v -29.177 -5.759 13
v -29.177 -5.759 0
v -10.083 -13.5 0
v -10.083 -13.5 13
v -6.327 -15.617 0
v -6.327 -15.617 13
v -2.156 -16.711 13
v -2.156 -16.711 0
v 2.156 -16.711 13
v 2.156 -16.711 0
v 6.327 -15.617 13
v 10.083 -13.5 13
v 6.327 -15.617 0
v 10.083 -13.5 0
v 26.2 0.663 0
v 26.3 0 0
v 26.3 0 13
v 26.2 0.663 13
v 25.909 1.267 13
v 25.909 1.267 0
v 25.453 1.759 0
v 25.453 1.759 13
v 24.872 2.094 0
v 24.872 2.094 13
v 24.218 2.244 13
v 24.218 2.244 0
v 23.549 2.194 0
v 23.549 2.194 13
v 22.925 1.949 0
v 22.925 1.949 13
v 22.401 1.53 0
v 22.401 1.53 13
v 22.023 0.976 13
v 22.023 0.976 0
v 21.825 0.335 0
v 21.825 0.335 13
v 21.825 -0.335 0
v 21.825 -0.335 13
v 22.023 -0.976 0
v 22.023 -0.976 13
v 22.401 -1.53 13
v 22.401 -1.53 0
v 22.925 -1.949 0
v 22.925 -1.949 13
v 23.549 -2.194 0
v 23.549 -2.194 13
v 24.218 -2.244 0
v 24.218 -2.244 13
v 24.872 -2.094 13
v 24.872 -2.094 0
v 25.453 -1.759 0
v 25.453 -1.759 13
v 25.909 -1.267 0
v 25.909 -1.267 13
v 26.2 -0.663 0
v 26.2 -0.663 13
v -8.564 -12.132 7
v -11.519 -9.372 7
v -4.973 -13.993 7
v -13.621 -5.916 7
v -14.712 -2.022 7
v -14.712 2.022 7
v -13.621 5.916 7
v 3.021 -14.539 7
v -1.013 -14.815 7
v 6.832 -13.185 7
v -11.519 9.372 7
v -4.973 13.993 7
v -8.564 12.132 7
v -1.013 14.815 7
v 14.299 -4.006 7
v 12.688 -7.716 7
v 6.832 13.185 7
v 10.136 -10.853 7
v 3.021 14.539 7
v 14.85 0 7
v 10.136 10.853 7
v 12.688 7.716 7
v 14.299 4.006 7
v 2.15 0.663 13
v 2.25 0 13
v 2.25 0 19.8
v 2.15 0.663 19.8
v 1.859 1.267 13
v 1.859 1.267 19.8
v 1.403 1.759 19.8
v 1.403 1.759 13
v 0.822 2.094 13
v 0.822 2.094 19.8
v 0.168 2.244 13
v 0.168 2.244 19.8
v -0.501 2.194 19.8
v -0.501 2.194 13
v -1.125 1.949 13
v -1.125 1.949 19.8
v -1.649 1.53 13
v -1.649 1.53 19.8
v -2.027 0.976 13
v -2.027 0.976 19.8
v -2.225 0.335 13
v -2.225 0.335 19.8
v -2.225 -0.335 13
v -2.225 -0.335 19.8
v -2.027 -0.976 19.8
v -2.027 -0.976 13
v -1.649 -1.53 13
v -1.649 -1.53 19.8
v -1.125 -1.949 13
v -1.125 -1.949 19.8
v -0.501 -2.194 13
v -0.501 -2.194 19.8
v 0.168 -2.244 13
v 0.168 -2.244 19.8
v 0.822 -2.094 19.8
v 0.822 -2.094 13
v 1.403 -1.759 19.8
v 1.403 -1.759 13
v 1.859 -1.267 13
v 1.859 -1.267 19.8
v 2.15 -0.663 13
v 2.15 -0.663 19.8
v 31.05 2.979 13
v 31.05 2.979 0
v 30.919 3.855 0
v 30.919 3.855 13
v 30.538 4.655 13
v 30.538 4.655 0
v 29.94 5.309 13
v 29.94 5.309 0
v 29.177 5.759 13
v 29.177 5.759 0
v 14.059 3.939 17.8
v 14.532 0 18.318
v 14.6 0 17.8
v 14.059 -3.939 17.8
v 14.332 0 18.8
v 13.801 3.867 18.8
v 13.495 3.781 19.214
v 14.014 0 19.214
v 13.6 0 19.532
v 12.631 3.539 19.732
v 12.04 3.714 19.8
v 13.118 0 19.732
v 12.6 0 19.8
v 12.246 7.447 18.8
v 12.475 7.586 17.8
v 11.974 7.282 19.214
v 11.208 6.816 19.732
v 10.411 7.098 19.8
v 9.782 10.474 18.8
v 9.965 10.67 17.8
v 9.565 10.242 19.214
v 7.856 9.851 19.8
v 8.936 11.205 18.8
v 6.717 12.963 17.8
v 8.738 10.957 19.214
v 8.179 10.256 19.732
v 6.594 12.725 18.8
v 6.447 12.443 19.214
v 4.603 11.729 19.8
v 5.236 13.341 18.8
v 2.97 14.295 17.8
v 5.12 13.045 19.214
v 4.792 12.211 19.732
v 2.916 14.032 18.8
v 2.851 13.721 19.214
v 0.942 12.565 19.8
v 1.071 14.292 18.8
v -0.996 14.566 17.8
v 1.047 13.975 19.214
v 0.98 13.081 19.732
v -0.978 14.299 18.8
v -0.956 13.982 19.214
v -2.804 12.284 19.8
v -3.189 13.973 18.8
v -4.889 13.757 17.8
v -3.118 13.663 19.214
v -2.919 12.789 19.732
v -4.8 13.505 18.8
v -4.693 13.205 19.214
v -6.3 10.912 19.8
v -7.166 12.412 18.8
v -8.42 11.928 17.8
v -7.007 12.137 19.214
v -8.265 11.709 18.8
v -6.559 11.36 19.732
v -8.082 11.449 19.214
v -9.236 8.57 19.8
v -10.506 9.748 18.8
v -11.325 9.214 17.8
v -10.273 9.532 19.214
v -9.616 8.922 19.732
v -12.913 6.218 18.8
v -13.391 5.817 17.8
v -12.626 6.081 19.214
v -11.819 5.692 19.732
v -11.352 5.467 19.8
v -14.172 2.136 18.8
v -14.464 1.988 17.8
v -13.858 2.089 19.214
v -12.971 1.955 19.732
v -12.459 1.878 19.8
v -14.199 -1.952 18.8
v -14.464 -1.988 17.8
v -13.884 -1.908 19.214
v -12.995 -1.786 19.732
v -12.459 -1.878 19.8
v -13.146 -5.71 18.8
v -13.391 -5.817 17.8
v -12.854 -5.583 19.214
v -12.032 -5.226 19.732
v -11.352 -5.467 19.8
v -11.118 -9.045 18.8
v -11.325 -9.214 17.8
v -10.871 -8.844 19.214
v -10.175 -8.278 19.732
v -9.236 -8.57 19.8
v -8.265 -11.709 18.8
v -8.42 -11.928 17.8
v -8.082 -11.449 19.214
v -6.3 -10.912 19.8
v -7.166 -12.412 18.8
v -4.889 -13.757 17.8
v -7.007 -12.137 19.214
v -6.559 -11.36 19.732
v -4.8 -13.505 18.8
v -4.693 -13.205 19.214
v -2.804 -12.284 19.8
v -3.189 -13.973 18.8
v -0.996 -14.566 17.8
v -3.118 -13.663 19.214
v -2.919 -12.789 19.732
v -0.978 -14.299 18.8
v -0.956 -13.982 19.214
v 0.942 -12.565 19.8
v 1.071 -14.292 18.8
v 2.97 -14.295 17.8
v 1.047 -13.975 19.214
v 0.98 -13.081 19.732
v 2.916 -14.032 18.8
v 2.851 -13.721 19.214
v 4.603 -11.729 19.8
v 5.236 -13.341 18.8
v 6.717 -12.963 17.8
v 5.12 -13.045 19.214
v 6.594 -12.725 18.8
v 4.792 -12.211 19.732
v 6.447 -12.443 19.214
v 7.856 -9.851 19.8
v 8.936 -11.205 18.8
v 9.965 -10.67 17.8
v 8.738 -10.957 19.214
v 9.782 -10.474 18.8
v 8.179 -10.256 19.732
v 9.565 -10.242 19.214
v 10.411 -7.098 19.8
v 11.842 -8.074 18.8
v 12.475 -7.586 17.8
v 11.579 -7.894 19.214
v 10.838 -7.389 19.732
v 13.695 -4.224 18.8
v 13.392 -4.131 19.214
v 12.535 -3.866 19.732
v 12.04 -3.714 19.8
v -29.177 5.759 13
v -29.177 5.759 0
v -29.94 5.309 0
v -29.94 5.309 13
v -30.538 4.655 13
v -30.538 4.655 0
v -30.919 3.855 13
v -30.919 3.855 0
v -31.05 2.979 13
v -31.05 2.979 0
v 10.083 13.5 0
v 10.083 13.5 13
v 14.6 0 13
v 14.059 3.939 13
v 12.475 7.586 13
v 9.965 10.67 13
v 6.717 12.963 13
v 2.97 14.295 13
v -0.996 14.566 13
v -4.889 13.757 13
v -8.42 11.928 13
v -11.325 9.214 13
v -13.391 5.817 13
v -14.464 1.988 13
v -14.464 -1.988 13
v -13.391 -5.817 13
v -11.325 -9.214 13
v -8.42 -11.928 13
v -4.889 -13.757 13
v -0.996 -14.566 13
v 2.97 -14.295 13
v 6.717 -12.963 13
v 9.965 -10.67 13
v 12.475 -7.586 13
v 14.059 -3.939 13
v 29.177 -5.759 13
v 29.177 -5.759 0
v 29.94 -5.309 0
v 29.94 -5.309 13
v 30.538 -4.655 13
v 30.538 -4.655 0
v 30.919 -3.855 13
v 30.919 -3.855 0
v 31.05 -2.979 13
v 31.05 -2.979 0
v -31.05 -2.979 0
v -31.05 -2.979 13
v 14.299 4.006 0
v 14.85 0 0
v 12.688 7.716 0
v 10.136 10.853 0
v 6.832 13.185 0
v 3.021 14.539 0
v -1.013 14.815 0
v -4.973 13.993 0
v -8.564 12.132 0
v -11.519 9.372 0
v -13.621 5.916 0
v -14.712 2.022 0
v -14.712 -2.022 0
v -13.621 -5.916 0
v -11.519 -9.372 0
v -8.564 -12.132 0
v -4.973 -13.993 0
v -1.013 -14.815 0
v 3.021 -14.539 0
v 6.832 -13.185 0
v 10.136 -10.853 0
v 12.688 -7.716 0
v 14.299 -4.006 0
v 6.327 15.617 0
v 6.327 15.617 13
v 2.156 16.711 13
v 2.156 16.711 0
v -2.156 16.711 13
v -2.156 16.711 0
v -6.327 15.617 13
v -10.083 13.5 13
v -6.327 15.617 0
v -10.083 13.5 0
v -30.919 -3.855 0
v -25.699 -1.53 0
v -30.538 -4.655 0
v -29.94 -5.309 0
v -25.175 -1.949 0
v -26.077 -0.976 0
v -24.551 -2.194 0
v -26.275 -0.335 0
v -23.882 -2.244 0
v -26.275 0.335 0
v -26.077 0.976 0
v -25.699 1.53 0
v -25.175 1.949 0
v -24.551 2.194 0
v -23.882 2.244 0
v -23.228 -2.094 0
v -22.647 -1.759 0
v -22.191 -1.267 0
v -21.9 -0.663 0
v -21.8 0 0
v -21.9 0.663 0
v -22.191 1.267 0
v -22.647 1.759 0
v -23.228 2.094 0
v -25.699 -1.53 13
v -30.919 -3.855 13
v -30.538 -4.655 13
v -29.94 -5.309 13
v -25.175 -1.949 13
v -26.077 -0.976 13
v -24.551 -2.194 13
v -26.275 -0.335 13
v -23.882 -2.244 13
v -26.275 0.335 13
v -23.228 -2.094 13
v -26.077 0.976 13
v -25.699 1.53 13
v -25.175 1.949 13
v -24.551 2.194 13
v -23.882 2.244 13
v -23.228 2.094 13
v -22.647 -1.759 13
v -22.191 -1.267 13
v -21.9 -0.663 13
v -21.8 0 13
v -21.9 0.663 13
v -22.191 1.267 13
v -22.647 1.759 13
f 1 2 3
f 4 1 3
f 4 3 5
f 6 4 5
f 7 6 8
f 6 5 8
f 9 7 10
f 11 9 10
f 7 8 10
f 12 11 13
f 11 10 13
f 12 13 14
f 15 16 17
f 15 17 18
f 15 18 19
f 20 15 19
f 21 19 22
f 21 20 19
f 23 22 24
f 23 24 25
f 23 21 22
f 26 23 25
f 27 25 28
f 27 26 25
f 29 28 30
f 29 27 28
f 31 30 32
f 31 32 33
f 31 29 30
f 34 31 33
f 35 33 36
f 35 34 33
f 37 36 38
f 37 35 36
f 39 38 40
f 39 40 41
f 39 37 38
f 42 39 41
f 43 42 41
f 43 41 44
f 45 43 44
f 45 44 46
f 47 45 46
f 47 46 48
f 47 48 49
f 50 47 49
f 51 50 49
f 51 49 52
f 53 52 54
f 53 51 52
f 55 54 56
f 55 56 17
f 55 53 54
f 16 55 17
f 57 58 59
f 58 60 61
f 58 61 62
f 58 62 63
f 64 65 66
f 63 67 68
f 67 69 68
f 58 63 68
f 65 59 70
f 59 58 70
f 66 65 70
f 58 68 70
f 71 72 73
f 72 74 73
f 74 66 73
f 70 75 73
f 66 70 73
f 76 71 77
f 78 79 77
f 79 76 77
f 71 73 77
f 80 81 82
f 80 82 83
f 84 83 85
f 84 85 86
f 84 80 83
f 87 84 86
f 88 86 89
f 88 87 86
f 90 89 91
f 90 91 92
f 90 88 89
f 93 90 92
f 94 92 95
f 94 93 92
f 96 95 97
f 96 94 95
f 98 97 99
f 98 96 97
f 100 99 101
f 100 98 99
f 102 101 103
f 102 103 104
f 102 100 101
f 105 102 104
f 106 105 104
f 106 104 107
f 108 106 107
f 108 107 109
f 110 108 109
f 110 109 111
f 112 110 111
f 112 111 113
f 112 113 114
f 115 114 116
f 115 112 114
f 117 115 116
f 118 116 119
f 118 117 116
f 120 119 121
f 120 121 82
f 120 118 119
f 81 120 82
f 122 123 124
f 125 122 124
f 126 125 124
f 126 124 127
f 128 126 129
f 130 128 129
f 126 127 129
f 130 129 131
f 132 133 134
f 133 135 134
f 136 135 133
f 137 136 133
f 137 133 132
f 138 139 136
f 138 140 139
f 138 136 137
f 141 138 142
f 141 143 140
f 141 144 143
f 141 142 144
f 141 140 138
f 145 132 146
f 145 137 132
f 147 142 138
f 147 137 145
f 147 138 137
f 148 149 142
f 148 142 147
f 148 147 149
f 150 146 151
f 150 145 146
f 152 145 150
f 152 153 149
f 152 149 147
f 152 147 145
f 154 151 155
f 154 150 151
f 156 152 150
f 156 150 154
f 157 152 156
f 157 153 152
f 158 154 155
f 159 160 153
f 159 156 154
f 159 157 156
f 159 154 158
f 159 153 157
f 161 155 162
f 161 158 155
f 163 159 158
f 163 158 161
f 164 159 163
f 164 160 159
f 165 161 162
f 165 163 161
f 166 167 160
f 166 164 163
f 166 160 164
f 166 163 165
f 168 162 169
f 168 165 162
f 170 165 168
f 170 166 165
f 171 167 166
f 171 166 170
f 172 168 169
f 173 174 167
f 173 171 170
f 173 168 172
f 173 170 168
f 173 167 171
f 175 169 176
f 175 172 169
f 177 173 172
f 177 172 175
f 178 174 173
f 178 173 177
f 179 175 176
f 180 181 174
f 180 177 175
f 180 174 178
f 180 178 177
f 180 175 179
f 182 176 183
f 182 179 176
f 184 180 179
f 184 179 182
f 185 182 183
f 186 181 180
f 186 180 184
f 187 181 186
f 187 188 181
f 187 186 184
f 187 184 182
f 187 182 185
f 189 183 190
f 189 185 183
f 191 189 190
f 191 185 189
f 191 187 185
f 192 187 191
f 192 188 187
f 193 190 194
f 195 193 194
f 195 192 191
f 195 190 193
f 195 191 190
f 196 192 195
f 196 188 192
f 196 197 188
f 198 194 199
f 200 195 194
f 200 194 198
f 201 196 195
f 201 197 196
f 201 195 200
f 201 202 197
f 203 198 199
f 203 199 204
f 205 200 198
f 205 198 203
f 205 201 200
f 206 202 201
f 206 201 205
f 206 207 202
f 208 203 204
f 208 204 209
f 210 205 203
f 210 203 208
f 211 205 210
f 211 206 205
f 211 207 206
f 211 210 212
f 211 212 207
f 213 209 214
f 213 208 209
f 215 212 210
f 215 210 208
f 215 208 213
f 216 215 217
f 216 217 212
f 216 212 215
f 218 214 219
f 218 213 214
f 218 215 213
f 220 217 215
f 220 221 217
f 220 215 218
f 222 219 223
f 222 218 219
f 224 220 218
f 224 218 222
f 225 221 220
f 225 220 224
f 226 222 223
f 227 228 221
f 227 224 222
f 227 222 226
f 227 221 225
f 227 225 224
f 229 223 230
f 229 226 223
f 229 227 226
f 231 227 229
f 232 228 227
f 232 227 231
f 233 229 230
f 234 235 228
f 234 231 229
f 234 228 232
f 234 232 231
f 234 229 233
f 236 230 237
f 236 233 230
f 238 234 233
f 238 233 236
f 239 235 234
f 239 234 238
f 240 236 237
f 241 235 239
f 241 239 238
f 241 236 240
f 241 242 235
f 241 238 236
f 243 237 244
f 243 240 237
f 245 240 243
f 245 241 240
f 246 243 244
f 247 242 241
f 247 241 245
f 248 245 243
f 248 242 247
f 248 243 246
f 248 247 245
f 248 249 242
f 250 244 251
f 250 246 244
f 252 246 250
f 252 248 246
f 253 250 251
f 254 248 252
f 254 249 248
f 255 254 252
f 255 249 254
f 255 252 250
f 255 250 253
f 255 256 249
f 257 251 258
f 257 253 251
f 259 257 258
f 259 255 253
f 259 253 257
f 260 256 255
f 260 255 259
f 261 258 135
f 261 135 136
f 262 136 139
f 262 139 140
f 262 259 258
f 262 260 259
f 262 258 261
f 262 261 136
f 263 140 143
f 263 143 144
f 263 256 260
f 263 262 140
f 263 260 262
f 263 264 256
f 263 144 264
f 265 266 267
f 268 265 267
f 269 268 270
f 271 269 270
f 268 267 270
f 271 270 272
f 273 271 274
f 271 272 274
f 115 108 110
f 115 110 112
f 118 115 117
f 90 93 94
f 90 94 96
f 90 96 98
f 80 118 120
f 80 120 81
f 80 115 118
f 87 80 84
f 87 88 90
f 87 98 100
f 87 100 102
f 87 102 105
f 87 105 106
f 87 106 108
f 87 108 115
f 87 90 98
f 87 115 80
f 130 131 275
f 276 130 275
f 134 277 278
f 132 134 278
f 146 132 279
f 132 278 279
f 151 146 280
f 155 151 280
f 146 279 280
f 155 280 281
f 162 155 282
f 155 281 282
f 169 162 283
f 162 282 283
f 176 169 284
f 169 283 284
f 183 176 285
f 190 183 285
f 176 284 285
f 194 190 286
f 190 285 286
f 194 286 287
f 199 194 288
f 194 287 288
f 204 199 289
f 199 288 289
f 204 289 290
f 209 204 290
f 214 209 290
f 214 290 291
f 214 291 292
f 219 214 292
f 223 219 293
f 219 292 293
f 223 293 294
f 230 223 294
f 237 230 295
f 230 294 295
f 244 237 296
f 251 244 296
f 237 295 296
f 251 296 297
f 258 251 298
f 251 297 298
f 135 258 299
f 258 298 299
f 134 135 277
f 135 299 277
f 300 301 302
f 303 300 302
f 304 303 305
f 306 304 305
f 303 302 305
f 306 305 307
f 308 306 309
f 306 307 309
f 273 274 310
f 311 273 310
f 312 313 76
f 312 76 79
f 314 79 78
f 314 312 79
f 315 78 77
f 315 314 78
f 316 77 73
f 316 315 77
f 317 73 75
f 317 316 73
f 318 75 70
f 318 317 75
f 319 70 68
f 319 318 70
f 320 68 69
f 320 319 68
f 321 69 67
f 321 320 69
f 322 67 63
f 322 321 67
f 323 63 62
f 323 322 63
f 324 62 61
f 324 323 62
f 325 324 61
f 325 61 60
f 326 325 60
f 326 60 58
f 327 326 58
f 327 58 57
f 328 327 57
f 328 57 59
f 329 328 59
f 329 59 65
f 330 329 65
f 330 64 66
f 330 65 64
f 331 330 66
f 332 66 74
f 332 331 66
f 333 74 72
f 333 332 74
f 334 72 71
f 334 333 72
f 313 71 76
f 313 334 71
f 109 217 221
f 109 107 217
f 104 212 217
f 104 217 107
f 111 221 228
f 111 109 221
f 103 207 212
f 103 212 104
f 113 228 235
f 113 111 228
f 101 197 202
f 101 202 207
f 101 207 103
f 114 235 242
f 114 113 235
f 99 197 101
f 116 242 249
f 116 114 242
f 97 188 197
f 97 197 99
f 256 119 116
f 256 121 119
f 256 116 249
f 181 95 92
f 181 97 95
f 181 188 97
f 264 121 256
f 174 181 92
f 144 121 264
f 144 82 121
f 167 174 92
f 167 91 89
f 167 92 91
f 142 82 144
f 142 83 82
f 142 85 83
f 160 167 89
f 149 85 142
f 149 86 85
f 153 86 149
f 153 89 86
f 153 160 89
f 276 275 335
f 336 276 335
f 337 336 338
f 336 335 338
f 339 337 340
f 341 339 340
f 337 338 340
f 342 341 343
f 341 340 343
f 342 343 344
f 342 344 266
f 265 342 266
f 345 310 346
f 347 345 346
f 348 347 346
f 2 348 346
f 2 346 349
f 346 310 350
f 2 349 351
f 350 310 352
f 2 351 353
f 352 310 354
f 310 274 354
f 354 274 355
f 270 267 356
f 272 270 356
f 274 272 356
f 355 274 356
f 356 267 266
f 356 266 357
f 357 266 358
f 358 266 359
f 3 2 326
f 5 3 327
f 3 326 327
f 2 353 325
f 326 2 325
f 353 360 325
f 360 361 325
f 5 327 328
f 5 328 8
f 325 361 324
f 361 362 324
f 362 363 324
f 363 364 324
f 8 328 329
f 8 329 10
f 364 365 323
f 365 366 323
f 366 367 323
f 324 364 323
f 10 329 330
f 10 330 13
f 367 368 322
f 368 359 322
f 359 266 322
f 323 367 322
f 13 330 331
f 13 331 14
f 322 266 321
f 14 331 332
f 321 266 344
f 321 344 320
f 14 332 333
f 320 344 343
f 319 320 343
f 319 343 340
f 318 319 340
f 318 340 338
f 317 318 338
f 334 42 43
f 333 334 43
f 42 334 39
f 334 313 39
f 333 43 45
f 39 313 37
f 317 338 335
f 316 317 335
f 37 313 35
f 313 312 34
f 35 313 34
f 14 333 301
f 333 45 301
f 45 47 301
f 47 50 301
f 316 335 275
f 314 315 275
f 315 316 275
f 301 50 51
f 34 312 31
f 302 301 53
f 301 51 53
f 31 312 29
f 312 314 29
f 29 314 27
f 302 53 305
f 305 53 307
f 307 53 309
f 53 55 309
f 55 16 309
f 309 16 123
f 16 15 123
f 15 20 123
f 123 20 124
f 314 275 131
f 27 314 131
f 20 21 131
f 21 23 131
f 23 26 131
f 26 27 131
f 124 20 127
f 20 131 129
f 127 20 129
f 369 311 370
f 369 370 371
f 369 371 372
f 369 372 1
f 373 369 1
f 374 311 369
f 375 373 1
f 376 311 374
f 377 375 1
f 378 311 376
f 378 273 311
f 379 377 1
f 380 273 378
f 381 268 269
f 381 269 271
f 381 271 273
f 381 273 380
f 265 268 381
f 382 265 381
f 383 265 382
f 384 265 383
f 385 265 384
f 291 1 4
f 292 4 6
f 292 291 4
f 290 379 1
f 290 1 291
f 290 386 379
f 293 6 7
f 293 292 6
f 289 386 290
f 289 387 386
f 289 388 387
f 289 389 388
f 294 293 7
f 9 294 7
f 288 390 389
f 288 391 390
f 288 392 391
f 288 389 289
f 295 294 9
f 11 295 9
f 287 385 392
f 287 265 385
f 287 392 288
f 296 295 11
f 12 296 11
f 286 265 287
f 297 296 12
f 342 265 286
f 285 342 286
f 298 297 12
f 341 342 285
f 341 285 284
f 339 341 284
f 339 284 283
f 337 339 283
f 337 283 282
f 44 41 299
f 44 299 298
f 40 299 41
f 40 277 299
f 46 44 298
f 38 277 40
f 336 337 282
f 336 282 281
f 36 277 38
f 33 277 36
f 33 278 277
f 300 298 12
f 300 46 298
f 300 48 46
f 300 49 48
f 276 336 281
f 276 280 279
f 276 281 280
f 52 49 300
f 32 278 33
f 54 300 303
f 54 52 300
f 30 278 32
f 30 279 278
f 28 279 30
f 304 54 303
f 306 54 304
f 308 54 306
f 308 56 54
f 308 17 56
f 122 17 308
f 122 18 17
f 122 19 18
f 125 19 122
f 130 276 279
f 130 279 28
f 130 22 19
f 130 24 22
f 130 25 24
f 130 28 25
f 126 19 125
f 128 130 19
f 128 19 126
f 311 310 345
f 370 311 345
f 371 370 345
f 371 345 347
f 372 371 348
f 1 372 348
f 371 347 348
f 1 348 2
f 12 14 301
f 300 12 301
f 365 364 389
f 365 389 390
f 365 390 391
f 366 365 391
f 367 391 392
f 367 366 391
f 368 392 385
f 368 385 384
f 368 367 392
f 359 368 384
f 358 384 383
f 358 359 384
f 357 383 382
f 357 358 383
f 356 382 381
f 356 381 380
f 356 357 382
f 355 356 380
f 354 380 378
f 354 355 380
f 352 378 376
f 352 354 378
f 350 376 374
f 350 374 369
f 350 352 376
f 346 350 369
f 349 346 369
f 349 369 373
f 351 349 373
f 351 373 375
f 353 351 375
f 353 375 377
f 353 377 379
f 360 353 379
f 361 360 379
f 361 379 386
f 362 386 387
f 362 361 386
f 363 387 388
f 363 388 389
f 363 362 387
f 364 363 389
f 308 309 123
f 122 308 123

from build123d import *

# Parameters (mm, degrees)
F0_R     = 14.85
F0_R_2   = 2.25
F1_DEPTH = 13
F2_R     = 15.05
F3_DEPTH = 6
F4_R     = 14.6
F4_R_2   = 2.25
F5_DEPTH = 6.8
F6_R     = 2


with BuildPart() as f1:
    # F0 (on Top) → F1 (new body)
    with BuildSketch(Plane.XY):
        with BuildLine():
            ThreePointArc((10.083278, -13.5), (15.063627, -7.550472), (16.85, 0))
            ThreePointArc((16.85, 0), (15.063627, 7.550472), (10.083278, 13.5))
            ThreePointArc((10.083278, 13.5), (0, 16.85), (-10.083278, 13.5))
            ThreePointArc((-10.083278, 13.5), (-16.85, 0), (-10.083278, -13.5))
            ThreePointArc((-10.083278, -13.5), (0, -16.85), (10.083278, -13.5))
        make_face()
        Circle(F0_R, mode=Mode.SUBTRACT)
        with BuildLine():
            ThreePointArc((10.083278, 13.5), (15.063627, 7.550472), (16.85, 0))
            ThreePointArc((16.85, 0), (15.063627, -7.550472), (10.083278, -13.5))
            Line((10.083278, -13.5), (29.177113, -5.759277))
            ThreePointArc((29.177113, -5.759277), (30.538106, -4.655164), (31.05, -2.979058))
            Line((31.05, -2.979058), (31.05, 0))
            Line((31.05, 0), (31.05, 2.979058))
            ThreePointArc((31.05, 2.979058), (30.538106, 4.655164), (29.177113, 5.759277))
            Line((29.177113, 5.759277), (10.083278, 13.5))
        make_face()
        with Locations((24.05, 0)):
            Circle(F0_R_2, mode=Mode.SUBTRACT)
        with BuildLine():
            ThreePointArc((-10.083278, -13.5), (-16.85, 0), (-10.083278, 13.5))
            Line((-10.083278, 13.5), (-29.177113, 5.759277))
            ThreePointArc((-29.177113, 5.759277), (-30.538106, 4.655164), (-31.05, 2.979058))
            Line((-31.05, 2.979058), (-31.05, 0))
            Line((-31.05, 0), (-31.05, -2.979058))
            ThreePointArc((-31.05, -2.979058), (-30.538106, -4.655164), (-29.177113, -5.759277))
            Line((-29.177113, -5.759277), (-10.083278, -13.5))
        make_face()
        with Locations((-24.05, 0)):
            Circle(F0_R_2, mode=Mode.SUBTRACT)
    extrude(amount=F1_DEPTH)

    # F2 (on face) → F3 (join)
    with BuildSketch(Plane.XY.offset(13)):
        Circle(F2_R)
    extrude(amount=-F3_DEPTH)

    # F4 (on face) → F5 (join)
    with BuildSketch(Plane.XY.offset(13)):
        Circle(F4_R)
        Circle(F4_R_2, mode=Mode.SUBTRACT)
    extrude(amount=F5_DEPTH)

    # F6
    f6_edges = [f1.edges().sort_by_distance(p)[0] for p in [
        (-14.6, 0, 19.8),
    ]]
    fillet(f6_edges, radius=F6_R)


solid = f1.part
